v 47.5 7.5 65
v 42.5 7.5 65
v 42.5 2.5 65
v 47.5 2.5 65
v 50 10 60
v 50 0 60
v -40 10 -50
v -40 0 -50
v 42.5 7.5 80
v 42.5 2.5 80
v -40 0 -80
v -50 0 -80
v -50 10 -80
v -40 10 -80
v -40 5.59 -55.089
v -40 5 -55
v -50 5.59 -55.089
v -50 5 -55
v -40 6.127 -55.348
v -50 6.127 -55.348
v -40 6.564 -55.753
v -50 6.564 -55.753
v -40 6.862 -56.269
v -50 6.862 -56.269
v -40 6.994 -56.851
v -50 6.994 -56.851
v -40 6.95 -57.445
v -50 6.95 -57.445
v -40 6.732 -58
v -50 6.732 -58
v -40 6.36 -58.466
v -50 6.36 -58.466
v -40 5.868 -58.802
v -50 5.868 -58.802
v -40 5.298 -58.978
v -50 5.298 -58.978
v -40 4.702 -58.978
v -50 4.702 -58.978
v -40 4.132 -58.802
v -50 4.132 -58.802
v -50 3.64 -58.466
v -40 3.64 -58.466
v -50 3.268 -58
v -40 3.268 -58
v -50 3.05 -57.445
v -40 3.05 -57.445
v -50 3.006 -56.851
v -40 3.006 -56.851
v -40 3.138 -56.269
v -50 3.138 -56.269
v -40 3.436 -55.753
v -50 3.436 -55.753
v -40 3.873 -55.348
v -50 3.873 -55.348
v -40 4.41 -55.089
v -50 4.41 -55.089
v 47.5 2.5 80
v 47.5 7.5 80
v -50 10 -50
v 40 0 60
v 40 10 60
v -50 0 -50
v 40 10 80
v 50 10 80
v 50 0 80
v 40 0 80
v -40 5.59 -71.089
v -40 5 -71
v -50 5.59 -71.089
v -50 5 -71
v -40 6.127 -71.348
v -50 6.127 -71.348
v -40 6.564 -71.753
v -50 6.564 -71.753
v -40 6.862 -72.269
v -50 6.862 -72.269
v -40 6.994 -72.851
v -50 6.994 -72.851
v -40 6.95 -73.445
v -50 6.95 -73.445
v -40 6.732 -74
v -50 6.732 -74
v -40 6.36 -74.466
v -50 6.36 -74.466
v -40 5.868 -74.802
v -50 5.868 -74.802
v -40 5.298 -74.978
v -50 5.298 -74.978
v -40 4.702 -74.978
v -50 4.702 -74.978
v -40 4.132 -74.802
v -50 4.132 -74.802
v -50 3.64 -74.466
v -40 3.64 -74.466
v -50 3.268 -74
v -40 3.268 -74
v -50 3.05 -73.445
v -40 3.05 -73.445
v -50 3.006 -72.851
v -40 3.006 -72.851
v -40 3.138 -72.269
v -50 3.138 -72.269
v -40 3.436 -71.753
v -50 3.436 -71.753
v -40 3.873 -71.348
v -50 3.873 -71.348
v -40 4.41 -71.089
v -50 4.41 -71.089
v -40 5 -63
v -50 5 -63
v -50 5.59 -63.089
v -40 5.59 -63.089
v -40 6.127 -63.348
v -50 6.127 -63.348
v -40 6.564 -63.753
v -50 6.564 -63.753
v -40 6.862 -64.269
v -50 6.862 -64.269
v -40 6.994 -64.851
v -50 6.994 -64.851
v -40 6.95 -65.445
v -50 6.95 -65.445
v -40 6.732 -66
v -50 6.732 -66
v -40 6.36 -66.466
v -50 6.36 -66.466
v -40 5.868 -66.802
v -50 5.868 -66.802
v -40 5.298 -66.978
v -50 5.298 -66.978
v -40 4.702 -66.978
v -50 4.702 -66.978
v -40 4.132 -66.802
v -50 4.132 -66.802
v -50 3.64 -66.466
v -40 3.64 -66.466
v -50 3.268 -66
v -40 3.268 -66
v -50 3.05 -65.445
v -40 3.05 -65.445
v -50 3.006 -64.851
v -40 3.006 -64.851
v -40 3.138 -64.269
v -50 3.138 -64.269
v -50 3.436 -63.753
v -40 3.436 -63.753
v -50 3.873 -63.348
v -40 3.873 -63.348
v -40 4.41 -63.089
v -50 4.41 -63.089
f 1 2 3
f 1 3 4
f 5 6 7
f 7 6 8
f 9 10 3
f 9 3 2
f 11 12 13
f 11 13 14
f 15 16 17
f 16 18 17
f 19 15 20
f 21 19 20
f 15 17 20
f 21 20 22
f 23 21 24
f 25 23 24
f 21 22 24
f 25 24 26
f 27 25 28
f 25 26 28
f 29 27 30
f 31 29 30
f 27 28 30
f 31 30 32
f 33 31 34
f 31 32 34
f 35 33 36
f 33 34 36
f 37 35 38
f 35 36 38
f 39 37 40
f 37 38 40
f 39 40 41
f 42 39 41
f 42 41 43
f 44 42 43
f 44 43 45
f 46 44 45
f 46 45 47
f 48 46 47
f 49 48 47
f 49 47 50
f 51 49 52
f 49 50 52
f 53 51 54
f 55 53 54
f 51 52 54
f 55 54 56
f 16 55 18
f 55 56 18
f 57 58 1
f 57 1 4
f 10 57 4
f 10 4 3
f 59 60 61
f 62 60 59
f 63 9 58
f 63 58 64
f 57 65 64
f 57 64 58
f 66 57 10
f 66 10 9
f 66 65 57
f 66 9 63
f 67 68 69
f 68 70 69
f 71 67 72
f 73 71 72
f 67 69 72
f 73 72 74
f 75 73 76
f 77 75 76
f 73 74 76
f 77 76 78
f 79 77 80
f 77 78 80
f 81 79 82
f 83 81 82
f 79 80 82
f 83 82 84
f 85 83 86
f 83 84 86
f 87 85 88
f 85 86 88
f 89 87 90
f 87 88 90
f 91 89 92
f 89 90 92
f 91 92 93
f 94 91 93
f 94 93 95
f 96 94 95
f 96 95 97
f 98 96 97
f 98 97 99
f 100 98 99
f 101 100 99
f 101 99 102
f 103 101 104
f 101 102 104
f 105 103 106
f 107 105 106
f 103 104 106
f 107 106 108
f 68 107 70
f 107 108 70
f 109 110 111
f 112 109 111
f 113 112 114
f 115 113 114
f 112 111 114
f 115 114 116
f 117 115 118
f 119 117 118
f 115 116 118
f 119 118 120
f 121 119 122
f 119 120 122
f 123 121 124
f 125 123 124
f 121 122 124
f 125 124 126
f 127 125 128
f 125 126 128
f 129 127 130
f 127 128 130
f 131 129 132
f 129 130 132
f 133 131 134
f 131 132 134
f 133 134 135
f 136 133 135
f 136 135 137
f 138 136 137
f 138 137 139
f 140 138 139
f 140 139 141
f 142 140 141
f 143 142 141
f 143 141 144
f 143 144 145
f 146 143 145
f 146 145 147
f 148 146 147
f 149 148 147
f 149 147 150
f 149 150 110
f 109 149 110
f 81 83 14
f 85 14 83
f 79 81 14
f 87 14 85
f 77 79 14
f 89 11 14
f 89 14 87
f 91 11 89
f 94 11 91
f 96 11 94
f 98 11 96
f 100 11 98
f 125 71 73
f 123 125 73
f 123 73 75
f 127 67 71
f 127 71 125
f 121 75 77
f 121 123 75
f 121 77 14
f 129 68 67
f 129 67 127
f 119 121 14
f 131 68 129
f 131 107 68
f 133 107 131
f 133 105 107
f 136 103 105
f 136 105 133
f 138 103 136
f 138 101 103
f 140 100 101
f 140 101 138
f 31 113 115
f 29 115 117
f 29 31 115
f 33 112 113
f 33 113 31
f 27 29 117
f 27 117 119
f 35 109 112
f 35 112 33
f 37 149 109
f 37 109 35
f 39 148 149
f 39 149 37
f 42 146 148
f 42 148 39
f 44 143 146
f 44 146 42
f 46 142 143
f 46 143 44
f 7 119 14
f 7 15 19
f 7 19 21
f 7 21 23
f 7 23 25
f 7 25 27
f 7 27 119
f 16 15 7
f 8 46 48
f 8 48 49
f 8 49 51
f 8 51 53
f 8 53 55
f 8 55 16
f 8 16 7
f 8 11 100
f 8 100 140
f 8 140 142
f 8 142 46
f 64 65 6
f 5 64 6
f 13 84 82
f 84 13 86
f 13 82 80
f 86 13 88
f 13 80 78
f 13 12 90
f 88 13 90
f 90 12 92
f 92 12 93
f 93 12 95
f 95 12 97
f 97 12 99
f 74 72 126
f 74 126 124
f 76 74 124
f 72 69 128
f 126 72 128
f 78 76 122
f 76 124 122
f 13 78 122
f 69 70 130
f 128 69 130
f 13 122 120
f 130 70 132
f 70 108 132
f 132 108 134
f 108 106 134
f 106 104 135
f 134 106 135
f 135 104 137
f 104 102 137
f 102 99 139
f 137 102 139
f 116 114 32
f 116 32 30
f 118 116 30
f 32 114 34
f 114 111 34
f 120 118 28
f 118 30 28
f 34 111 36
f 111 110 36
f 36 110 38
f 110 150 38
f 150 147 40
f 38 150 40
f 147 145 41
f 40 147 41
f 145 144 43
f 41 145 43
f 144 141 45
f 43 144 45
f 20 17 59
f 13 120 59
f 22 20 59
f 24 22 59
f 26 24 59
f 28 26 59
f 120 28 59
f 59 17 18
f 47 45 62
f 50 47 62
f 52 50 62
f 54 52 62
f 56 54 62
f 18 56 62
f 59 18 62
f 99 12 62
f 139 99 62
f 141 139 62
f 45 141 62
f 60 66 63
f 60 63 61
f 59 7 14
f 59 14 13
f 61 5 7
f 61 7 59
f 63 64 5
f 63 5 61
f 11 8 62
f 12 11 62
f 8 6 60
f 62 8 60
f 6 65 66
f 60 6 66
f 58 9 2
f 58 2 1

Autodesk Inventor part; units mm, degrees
ref_plane "YZ Plane" through (0, 0, 0) normal (1, 0, 0) x (0, 1, 0)
ref_plane "XZ Plane" through (0, 0, 0) normal (0, 1, 0) x (-1, 0, 0)
ref_plane "XY Plane" through (0, 0, 0) normal (0, 0, 1) x (1, 0, 0)
sketch "Sketch1" plane through (0, 0, 0) normal (0, 1, 0) x (-1, 0, 0)
  line L0 (50, 80) -> (-50, 80) construction
  line L1 (-50, 80) -> (-50, -80) construction
  line L2 (-50, -80) -> (50, -80) construction
  line L3 (50, -80) -> (50, 80) construction
  line L4 (50, -80) -> (40, -80)
  line L5 (40, -80) -> (40, -50)
  line L6 (50, -80) -> (50, -50)
  line L7 (-50, 80) -> (-50, 60)
  line L8 (-50, 80) -> (-40, 80)
  line L9 (-40, 80) -> (-40, 60)
  line L10 (-40, 60) -> (50, -50)
  line L11 (-50, 60) -> (40, -50)
  point P0 (0, 0)
  point P1 (50, 0)
  point P2 (0, -80)
  dimension "d0" = 160
  dimension "d1" = 100
  dimension "d2" = 10
  dimension "d3" = 30
  dimension "d4" = 20
  dimension "d5" = 10
extrude "Extrusion1" add sketch "Sketch1" along normal blind 10
sketch "Sketch2" plane through (40, 0, 80) normal (0, 0, 1) x (1, 0, 0)
  line L0 (-90, 0) -> (0, 0) construction
  line L1 (10, 10) -> (-80, 10) construction
  line L2 (0, 0) -> (10, 10) construction
  line L3 (2.5, 7.5) -> (7.5, 7.5)
  line L4 (7.5, 7.5) -> (7.5, 2.5)
  line L5 (7.5, 2.5) -> (2.5, 2.5)
  line L6 (2.5, 2.5) -> (2.5, 7.5)
  line L7 (2.5, 7.5) -> (7.5, 2.5) construction
  line L8 (7.5, 7.5) -> (2.5, 2.5) construction
  point P0 (-40, 0)
  point P1 (5, 5)
  dimension "d8" = 5
  dimension "d9" = 5
extrude "Extrusion2" cut sketch "Sketch2" against normal blind 15
sketch "Sketch3" plane through (-50, 0, -80) normal (-1, 0, 0) x (0, 0, 1)
  line L0 (30, 0) -> (30, 10) construction
  line L1 (30, 5) -> (0, 5) construction
  line L2 (0, 0) -> (0, 10) construction
  line L3 (15, 5) -> (7, 5) construction
  line L4 (15, 5) -> (23, 5) construction
  circle A0 centre (7, 5) radius 2
  circle A1 centre (15, 5) radius 2
  circle A2 centre (23, 5) radius 2
  point P0 (80, 0)
  dimension "d12" = 8
  dimension "d13" = 8
  dimension "d14" = 4
  dimension "d15" = 4
  dimension "d16" = 4
extrude "Extrusion3" cut sketch "Sketch3" against normal blind 15
properties part number "Arm"
